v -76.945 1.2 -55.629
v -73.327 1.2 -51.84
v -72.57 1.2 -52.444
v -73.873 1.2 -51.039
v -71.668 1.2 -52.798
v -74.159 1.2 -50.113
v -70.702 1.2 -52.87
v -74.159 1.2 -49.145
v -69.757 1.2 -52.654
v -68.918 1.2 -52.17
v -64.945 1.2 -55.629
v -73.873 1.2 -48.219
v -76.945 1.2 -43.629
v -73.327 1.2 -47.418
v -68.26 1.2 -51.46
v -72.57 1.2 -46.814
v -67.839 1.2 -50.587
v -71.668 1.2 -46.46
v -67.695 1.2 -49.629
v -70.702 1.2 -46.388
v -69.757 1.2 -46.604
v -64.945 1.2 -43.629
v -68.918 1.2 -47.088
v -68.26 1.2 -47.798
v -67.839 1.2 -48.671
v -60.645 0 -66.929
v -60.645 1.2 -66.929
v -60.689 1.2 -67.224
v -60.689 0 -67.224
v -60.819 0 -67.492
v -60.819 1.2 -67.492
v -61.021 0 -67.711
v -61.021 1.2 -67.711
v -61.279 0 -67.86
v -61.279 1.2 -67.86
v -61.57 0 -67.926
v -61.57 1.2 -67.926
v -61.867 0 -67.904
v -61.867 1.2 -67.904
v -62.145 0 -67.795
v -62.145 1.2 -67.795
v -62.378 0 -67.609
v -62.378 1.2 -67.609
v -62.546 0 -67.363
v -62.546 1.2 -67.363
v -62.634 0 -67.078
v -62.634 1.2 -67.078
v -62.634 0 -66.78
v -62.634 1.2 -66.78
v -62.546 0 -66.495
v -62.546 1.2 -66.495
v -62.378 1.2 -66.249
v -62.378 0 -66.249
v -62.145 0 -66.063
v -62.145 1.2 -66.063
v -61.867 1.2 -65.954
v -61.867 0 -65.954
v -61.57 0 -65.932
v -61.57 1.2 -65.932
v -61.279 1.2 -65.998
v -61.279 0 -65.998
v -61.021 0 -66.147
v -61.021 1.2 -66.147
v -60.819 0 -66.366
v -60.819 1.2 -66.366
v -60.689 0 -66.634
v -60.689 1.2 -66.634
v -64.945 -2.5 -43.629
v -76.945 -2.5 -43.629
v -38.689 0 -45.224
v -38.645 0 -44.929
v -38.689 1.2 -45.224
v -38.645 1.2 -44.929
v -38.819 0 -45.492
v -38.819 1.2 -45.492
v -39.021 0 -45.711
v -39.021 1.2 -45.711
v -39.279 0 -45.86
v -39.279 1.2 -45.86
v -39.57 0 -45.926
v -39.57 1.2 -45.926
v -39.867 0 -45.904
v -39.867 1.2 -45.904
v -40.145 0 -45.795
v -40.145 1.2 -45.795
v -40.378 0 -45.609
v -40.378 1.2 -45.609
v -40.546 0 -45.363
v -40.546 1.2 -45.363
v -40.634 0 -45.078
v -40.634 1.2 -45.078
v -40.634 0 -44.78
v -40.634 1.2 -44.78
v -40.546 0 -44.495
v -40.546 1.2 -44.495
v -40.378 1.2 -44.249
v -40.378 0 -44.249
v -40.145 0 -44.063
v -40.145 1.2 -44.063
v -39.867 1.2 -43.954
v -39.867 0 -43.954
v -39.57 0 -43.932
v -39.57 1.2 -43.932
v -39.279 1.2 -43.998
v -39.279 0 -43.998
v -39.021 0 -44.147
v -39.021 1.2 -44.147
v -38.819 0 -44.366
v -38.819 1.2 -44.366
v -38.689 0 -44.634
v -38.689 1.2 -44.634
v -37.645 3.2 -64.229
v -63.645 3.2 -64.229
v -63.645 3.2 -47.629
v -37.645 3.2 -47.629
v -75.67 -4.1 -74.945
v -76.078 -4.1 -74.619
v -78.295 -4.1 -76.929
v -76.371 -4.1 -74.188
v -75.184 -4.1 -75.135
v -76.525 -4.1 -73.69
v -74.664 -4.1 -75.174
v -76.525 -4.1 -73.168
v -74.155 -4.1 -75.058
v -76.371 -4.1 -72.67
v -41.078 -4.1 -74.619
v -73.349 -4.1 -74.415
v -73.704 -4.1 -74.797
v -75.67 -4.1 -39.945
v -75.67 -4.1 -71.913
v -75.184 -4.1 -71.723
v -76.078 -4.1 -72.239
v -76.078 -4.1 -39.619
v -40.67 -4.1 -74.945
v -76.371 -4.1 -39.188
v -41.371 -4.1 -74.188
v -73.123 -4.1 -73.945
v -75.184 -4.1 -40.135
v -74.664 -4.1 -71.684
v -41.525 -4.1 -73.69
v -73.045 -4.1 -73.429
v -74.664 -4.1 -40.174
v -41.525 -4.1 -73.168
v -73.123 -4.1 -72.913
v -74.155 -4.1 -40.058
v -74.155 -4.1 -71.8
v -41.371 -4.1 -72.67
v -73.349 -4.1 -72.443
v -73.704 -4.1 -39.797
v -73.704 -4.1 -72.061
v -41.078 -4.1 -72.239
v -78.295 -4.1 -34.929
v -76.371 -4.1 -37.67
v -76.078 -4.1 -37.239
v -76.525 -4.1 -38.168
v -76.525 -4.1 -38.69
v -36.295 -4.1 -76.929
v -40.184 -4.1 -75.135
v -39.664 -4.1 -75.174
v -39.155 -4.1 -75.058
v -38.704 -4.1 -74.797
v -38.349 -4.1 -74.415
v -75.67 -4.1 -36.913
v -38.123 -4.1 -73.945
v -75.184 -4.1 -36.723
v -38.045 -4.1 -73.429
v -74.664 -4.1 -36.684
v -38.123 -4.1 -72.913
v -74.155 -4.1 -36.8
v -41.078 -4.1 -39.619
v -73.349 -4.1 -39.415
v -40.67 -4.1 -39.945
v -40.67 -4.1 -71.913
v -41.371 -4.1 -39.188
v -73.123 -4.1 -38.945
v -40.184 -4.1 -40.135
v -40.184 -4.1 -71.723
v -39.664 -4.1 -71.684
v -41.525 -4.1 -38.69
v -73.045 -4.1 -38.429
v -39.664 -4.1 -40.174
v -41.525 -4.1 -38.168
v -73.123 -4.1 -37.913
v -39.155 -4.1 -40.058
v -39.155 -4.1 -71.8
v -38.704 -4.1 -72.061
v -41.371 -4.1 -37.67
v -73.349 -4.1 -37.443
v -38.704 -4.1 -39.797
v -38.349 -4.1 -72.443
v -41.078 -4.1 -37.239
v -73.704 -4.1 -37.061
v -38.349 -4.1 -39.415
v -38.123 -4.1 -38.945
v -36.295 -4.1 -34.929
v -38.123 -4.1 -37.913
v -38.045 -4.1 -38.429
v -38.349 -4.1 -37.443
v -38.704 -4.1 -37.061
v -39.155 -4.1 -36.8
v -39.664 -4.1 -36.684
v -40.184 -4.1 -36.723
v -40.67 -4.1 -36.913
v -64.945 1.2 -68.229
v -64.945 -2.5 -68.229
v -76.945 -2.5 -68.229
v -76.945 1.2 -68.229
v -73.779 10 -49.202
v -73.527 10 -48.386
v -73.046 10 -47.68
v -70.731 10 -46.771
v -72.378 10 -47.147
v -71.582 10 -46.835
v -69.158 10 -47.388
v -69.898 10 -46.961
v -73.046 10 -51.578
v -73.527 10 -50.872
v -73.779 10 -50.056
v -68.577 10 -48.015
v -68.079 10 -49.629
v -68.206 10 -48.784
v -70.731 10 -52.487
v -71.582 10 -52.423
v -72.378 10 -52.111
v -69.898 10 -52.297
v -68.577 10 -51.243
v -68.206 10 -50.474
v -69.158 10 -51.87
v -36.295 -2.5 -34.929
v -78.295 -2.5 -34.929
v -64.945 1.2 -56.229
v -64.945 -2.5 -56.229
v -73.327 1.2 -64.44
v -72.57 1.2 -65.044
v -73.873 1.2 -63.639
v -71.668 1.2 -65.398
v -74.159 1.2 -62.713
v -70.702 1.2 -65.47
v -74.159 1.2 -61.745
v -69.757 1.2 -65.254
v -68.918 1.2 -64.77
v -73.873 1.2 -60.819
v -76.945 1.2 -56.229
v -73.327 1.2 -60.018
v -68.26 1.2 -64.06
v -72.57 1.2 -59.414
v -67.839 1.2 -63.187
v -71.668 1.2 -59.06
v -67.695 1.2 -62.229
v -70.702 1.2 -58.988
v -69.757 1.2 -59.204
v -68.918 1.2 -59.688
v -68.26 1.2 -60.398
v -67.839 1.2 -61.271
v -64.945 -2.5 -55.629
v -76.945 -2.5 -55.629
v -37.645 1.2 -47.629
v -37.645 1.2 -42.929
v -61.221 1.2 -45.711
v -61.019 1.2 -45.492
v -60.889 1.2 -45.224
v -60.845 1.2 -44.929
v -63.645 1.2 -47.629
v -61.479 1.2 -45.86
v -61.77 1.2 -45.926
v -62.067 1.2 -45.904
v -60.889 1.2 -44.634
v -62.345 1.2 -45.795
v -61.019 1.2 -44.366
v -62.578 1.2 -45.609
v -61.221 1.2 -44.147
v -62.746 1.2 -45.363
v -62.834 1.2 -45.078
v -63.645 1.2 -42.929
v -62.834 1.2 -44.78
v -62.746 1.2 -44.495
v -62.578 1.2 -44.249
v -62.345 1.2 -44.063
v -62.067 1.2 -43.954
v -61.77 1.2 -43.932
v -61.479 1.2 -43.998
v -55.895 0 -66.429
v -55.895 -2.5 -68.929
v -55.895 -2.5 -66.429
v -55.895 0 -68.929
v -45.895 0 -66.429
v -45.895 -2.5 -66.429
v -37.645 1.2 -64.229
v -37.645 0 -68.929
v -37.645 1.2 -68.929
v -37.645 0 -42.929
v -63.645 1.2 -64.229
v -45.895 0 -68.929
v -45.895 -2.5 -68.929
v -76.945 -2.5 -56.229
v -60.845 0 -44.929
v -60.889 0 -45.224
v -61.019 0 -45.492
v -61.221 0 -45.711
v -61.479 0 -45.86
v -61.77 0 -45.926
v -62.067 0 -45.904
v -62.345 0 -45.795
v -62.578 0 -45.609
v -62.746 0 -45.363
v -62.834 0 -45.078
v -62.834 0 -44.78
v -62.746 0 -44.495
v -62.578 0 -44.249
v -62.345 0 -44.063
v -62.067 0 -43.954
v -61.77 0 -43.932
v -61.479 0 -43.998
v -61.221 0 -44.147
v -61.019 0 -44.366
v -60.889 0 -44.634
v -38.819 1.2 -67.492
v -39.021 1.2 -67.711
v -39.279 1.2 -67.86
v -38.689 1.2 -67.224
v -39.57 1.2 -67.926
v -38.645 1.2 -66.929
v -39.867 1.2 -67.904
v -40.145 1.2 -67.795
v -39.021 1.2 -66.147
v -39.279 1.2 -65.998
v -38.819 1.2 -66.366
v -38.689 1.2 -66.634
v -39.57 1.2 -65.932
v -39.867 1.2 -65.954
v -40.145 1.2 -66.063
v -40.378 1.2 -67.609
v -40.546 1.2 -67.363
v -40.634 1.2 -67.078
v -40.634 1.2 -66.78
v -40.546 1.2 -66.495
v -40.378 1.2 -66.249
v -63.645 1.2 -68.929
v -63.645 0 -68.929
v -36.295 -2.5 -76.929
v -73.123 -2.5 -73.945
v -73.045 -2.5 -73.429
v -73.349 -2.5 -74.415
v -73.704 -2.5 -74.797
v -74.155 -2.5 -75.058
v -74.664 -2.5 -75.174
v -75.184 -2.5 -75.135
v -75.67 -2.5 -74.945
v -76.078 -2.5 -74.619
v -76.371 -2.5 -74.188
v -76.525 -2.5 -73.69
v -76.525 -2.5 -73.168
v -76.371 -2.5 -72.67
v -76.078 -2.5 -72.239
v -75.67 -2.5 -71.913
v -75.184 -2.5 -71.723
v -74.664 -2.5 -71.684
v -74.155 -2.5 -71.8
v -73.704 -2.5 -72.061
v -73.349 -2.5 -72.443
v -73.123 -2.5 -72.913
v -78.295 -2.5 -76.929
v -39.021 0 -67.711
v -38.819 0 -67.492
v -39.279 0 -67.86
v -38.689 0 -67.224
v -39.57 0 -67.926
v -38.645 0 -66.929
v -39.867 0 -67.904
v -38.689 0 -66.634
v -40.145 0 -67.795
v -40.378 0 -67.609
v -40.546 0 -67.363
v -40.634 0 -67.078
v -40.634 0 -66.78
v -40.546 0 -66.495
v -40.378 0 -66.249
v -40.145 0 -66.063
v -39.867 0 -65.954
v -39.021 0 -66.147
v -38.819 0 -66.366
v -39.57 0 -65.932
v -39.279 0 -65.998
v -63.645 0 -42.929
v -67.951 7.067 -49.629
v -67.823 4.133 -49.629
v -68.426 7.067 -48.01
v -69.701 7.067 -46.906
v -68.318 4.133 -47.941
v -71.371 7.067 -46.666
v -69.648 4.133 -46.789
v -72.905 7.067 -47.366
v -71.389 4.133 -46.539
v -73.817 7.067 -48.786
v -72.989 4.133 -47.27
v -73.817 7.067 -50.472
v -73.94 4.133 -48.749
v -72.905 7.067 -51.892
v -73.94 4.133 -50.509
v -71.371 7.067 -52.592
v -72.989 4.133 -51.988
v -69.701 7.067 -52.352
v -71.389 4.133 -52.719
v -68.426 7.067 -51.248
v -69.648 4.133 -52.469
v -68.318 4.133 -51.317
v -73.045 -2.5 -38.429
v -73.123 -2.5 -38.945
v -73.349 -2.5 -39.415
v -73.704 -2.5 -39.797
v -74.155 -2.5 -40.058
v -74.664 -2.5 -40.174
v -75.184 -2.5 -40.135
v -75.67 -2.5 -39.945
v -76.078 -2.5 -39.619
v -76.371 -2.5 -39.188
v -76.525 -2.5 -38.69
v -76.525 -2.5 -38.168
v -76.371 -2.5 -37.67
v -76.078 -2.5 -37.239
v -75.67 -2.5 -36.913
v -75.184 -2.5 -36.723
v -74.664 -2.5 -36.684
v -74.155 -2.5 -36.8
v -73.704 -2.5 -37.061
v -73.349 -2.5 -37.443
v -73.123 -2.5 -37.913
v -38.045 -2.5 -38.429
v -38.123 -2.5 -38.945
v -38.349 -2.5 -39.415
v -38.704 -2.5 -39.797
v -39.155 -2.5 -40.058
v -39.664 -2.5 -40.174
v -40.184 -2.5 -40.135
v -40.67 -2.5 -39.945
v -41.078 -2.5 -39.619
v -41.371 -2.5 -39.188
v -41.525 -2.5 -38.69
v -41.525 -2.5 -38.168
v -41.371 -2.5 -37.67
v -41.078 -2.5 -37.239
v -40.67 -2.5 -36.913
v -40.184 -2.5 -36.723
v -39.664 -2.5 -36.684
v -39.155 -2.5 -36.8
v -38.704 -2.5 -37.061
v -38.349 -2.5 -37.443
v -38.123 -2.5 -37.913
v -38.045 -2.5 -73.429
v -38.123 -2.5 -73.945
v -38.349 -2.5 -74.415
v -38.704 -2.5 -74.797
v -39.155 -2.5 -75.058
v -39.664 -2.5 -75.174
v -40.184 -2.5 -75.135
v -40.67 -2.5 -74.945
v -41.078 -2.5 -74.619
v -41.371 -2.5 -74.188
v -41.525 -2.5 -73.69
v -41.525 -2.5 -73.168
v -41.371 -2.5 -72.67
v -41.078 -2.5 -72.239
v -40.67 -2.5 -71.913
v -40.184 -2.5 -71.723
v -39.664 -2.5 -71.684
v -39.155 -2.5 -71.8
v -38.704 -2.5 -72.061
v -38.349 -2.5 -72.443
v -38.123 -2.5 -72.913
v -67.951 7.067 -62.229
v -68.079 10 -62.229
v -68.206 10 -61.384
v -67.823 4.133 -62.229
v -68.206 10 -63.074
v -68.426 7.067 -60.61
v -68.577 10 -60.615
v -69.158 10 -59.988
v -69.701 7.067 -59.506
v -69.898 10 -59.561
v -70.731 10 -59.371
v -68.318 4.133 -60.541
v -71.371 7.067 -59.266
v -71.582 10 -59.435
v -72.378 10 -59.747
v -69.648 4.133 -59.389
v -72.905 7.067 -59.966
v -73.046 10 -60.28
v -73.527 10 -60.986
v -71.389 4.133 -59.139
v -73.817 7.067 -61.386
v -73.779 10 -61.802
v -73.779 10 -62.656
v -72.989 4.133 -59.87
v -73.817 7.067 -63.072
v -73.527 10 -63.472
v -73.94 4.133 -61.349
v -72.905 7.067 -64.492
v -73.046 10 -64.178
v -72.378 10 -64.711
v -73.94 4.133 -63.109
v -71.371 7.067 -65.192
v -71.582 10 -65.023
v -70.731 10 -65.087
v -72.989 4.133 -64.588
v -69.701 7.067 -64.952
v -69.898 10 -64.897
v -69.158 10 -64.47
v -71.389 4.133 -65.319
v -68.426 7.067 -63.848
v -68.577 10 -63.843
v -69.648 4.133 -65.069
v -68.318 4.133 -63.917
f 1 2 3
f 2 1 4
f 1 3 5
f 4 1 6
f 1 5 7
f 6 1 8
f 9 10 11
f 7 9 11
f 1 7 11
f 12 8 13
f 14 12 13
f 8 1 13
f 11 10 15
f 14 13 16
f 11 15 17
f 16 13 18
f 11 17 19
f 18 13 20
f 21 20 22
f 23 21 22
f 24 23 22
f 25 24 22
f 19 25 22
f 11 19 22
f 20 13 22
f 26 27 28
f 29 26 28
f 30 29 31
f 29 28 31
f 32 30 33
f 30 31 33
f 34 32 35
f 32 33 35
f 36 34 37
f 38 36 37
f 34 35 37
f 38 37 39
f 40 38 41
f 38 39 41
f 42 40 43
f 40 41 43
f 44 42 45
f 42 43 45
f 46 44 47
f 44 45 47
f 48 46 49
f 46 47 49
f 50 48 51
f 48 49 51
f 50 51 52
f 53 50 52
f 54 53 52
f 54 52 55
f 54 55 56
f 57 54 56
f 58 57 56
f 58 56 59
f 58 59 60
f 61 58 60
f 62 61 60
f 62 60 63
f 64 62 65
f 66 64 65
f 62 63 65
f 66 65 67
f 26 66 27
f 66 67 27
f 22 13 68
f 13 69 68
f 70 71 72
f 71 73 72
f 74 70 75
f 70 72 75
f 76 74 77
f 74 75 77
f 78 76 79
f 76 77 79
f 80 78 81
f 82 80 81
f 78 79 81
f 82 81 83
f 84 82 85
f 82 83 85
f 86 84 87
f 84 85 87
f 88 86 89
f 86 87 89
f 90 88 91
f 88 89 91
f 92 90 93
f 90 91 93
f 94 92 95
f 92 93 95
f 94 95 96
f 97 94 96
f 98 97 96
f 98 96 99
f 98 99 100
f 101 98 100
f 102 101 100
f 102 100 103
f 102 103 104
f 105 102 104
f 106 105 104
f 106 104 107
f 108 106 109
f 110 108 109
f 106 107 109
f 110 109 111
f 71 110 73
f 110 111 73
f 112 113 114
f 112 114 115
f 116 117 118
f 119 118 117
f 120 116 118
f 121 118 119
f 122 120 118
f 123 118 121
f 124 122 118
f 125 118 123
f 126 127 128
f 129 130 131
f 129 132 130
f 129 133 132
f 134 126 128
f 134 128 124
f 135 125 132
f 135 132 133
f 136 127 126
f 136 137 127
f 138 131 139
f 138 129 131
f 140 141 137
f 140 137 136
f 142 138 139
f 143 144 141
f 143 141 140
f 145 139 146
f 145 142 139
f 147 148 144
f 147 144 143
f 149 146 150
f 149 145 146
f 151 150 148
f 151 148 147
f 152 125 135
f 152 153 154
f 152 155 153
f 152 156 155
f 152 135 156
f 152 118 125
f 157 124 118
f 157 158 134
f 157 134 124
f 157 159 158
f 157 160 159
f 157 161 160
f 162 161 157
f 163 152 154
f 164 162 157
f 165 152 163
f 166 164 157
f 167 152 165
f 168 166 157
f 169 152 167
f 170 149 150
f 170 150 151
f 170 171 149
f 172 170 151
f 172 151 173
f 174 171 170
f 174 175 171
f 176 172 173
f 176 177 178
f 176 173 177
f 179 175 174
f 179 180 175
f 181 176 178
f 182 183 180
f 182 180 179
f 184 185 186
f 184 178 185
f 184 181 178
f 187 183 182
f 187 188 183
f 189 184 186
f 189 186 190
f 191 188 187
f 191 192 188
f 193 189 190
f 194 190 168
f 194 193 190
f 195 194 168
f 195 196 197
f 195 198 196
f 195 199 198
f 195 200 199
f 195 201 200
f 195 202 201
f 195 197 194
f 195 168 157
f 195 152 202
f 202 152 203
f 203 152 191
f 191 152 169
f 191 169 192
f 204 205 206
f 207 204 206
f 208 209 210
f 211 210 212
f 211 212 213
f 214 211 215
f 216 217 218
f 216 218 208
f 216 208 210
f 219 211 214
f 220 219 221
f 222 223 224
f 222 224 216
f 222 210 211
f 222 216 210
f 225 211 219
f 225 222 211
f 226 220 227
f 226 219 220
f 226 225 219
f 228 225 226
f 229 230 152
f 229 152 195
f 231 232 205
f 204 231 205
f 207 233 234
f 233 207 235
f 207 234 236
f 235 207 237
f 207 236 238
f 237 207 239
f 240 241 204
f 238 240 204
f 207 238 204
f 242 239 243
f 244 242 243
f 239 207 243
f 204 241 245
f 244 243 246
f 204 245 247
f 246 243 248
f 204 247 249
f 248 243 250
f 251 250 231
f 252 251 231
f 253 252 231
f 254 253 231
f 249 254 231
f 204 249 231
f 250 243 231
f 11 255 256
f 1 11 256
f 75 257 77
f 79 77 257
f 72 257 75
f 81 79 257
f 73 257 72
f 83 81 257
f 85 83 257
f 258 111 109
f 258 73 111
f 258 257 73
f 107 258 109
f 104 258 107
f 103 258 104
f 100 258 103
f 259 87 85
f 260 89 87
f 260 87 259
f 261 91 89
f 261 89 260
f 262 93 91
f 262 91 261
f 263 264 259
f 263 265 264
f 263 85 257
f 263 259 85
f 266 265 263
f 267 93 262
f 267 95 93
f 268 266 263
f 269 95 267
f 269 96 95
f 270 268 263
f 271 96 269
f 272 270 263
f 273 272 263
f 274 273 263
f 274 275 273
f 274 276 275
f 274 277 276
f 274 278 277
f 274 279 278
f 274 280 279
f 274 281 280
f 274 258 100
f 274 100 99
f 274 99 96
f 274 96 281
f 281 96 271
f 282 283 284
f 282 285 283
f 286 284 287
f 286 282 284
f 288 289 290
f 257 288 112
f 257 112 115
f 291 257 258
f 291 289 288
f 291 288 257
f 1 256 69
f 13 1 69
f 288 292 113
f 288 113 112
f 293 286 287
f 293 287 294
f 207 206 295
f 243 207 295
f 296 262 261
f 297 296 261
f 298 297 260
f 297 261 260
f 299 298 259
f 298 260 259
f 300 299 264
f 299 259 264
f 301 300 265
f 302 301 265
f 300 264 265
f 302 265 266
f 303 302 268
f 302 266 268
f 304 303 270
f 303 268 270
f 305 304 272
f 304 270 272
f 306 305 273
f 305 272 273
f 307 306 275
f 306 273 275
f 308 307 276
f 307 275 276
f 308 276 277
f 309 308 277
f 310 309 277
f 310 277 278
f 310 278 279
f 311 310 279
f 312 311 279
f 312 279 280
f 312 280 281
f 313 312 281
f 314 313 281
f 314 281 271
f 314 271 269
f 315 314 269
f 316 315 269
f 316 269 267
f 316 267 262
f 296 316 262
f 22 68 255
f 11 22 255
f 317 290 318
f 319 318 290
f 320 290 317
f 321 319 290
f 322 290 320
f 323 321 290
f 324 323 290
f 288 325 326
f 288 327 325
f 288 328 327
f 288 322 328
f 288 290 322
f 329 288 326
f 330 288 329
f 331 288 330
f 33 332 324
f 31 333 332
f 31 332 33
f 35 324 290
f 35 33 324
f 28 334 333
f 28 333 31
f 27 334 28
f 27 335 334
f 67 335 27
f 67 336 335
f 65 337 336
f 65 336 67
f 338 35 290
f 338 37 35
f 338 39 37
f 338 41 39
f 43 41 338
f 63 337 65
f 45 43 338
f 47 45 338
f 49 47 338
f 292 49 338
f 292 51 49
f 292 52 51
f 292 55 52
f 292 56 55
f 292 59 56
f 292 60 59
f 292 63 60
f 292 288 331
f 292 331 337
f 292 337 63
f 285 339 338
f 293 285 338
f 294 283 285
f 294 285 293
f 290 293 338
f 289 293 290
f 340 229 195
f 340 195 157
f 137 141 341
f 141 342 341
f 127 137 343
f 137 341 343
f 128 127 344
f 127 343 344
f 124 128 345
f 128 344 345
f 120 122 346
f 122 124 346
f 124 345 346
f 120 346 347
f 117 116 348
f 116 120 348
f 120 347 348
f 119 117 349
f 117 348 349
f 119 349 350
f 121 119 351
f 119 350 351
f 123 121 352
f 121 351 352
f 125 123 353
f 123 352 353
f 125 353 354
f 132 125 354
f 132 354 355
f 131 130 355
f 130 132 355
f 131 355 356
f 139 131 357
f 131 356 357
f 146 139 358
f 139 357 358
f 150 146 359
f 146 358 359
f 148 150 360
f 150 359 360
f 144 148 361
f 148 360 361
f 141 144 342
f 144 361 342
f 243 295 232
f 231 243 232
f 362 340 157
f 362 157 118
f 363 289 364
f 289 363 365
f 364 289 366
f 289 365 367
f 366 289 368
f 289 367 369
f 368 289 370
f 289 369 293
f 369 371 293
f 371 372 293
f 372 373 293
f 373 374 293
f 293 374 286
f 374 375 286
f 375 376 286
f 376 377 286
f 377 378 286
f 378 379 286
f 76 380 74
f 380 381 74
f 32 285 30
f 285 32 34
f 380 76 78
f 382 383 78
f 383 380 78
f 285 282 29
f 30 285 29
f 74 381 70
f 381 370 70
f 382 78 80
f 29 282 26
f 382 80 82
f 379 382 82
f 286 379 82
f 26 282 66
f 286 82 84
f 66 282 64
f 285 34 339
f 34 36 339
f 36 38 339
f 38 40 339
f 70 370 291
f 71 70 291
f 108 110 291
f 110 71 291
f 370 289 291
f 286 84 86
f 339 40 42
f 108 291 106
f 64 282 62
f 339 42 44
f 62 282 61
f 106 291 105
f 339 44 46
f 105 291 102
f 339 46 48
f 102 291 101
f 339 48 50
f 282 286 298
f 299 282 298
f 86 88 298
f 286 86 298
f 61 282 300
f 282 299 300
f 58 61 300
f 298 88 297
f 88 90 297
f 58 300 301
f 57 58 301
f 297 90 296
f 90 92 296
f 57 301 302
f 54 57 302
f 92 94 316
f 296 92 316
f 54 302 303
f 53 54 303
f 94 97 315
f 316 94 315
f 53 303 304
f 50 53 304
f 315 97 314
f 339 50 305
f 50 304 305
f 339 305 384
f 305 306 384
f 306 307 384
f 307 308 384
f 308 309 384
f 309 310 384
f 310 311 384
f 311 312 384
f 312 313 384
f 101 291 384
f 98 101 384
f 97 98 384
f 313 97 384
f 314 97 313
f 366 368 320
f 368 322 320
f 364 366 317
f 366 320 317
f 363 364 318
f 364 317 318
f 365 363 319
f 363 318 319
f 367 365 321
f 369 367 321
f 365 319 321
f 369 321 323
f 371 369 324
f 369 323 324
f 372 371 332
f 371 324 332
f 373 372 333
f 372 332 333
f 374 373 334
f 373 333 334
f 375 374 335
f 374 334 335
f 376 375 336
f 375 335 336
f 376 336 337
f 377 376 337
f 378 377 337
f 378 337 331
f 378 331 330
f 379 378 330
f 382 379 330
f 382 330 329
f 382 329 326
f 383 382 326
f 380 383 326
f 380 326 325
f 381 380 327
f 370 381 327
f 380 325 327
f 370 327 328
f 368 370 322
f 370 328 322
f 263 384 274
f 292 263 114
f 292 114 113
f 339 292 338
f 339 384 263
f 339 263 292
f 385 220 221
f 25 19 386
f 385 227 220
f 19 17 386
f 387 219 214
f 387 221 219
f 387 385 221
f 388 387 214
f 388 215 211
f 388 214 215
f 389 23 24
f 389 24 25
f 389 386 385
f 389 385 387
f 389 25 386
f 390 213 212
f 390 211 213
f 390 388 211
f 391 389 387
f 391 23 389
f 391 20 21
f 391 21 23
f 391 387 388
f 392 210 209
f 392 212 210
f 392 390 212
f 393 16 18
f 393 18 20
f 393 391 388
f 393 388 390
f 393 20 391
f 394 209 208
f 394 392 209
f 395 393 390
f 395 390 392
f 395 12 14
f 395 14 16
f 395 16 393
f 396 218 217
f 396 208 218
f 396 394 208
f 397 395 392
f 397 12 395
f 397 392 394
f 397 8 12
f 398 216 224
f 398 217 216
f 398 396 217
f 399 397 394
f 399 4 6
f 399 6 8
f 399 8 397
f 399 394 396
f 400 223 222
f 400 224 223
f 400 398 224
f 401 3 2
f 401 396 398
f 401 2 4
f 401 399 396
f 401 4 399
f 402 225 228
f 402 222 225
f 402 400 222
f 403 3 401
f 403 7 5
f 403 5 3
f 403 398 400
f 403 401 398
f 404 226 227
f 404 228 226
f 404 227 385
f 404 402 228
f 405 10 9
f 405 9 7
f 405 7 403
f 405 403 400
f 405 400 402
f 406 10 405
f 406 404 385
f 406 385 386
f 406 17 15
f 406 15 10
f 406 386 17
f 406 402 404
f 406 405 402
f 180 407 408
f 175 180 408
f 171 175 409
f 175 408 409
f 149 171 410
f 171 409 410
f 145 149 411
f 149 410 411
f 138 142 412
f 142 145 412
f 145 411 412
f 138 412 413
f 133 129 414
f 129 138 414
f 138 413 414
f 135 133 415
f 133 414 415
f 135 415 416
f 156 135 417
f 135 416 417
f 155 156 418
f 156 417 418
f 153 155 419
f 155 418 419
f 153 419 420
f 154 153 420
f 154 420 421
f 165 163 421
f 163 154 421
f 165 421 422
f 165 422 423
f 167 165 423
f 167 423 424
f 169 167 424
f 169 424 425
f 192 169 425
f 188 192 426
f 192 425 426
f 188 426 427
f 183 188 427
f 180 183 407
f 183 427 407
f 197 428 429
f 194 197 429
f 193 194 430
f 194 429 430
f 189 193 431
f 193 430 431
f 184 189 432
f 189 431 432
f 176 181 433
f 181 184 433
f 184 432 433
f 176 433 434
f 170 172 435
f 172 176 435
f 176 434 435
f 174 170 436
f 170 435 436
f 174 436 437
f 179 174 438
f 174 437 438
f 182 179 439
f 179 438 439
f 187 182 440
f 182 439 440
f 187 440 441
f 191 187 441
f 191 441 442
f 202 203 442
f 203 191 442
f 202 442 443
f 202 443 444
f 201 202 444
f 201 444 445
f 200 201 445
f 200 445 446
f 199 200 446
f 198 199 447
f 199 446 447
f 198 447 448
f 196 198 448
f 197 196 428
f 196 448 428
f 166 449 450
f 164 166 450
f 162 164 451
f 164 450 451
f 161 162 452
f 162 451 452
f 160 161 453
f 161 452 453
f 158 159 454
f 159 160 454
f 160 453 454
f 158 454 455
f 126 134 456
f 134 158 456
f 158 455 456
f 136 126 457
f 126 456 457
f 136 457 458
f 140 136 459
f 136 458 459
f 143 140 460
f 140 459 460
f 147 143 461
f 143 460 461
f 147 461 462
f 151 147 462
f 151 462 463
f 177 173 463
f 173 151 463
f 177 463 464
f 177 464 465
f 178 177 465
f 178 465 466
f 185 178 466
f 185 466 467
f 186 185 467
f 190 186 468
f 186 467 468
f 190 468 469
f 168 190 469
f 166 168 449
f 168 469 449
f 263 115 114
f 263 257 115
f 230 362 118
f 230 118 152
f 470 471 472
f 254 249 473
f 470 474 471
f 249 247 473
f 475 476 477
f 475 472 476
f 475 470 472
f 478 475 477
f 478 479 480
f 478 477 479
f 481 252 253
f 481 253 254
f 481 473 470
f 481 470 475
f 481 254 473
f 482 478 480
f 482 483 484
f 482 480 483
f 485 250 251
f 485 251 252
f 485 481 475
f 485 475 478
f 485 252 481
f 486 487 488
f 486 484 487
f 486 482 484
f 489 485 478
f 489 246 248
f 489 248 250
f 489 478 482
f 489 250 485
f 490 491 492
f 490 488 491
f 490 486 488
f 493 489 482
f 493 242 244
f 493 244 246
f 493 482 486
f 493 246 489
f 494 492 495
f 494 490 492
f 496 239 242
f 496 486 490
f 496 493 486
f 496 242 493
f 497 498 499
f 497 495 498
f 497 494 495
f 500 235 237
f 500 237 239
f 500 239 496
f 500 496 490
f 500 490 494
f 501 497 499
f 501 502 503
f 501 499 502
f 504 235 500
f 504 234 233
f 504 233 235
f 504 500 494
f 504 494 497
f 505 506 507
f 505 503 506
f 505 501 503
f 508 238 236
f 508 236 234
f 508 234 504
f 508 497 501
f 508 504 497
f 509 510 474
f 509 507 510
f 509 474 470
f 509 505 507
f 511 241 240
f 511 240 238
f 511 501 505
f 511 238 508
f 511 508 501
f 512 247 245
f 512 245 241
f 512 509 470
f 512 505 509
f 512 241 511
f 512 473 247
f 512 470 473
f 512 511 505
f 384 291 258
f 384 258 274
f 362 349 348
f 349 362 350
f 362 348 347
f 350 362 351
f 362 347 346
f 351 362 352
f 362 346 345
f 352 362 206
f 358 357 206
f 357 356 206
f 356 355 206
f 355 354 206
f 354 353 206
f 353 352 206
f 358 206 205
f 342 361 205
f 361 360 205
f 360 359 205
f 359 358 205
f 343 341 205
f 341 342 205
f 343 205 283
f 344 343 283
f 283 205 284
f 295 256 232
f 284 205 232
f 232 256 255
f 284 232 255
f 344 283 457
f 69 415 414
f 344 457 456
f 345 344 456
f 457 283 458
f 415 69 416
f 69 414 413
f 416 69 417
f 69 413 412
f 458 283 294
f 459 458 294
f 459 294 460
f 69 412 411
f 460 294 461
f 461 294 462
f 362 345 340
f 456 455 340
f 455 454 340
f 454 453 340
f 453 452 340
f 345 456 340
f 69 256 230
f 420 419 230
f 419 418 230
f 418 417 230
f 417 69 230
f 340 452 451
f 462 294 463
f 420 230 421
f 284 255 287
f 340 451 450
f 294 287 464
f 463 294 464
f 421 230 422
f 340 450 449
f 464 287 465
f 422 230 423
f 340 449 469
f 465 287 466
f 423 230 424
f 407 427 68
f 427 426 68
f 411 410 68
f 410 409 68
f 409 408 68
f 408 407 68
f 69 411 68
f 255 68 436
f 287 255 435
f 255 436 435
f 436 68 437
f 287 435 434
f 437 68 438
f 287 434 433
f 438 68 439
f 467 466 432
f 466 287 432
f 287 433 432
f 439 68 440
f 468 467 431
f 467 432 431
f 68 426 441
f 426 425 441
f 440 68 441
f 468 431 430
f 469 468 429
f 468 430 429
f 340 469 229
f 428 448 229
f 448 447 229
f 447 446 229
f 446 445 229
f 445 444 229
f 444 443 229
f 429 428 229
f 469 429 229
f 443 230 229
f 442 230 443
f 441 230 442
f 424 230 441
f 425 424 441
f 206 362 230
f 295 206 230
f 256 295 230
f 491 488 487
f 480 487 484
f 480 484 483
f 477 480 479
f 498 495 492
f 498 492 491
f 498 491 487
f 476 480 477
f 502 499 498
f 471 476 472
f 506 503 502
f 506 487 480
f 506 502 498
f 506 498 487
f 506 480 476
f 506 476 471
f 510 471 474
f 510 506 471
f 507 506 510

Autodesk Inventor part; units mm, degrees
ref_plane "YZ Plane" through (0, 0, 0) normal (1, 0, 0) x (0, 1, 0)
ref_plane "XZ Plane" through (0, 0, 0) normal (0, 1, 0) x (-1, 0, 0)
ref_plane "XY Plane" through (0, 0, 0) normal (0, 0, 1) x (1, 0, 0)
sketch "Sketch1" plane through (0, 0, 0) normal (0, 1, 0) x (-1, 0, 0)
  line L0 (63.6448, -68.929) -> (37.6448, -68.929)
  line L1 (37.6448, -68.929) -> (37.6448, -42.929)
  line L2 (37.6448, -42.929) -> (63.6448, -42.929)
  line L3 (63.6448, -42.929) -> (63.6448, -68.929)
  point P0 (0, 0)
  dimension "d0" = 26
  dimension "d1" = 26
extrude "Extrusion1" add sketch "Sketch1" along normal blind 1.2
sketch "Sketch2" plane through (0, 1.2, 0) normal (0, 1, 0) x (1, 0, 0)
  line L0 (-63.6448, 68.929) -> (-63.6448, 42.929) projected
  line L1 (-37.6448, 42.929) -> (-37.6448, 68.929) projected
  line L2 (-63.6448, 64.229) -> (-37.6448, 64.229)
  line L3 (-37.6448, 64.229) -> (-37.6448, 47.629)
  line L4 (-37.6448, 47.629) -> (-63.6448, 47.629)
  line L5 (-63.6448, 47.629) -> (-63.6448, 64.229)
  line L6 (-37.6448, 68.929) -> (-63.6448, 68.929) projected
  point P0 (0, 0)
  point P1 (-63.6448, 47.629)
  dimension "d4" = 4.7
  dimension "d5" = 16.6
extrude "Extrusion2" add sketch "Sketch2" along normal blind 2 contours L2 L1 L4 L0
sketch "Sketch3" plane through (0, 1.2, 0) normal (0, 1, 0) x (1, 0, 0)
  circle A0 centre (-61.6448, 66.929) radius 1
  circle A1 centre (-39.6448, 66.929) radius 1
  circle A2 centre (-39.6448, 44.929) radius 1
  circle A3 centre (-61.8448, 44.929) radius 1
  line L0 (-63.6448, 68.929) -> (-63.6448, 64.229) projected
  line L1 (-37.6448, 68.929) -> (-63.6448, 68.929) projected
  line L2 (-37.6448, 64.229) -> (-37.6448, 68.929) projected
  line L3 (-37.6448, 42.929) -> (-37.6448, 47.629) projected
  line L4 (-63.6448, 42.929) -> (-37.6448, 42.929) projected
  line L5 (-63.6448, 47.629) -> (-63.6448, 42.929) projected
  point P0 (0, 0)
  point P1 (-63.6448, 45.279)
  dimension "d8" = 2
  dimension "d9" = 2
  dimension "d10" = 2
  dimension "d11" = 2
  dimension "d12" = 2
  dimension "d13" = 2
  dimension "d14" = 2
  dimension "d15" = 2
  dimension "d16" = 2
  dimension "d17" = 2
  dimension "d18" = 2
  dimension "d19" = 1.8
extrude "Extrusion3" cut sketch "Sketch3" against normal through all
sketch "Sketch4" plane through (0, 0, 0) normal (0, -1, 0) x (1, 0, 0)
  line L0 (-45.8948, -68.929) -> (-55.8948, -68.929)
  line L1 (-55.8948, -68.929) -> (-55.8948, -66.429)
  line L2 (-55.8948, -66.429) -> (-45.8948, -66.429)
  line L3 (-45.8948, -66.429) -> (-45.8948, -68.929)
  line L4 (-37.6448, -68.929) -> (-63.6448, -68.929) projected
  line L5 (-37.6448, -42.929) -> (-37.6448, -68.929) projected
  point P0 (0, 0)
  dimension "d22" = 10
  dimension "d23" = 2.5
  dimension "d24" = 0
  dimension "d25" = 8.25
extrude "Extrusion4" add sketch "Sketch4" along normal blind 2.5
sketch "Sketch5" plane through (0, -2.5, 0) normal (0, -1, 0) x (1, 0, 0)
  line L0 (-64.9448, -68.229) -> (-76.9448, -68.229)
  line L1 (-76.9448, -68.229) -> (-76.9448, -56.229)
  line L2 (-76.9448, -56.229) -> (-64.9448, -56.229)
  line L3 (-64.9448, -56.229) -> (-64.9448, -68.229)
  line L4 (-64.9448, -55.629) -> (-76.9448, -55.629)
  line L5 (-76.9448, -55.629) -> (-76.9448, -43.629)
  line L6 (-76.9448, -43.629) -> (-64.9448, -43.629)
  line L7 (-64.9448, -43.629) -> (-64.9448, -55.629)
  line L8 (-55.8948, -68.929) -> (-63.6448, -68.929) projected
  line L9 (-63.6448, -68.929) -> (-63.6448, -42.929) projected
  line L10 (-63.6448, -42.929) -> (-37.6448, -42.929) projected
  point P0 (0, 0)
  dimension "d28" = 12
  dimension "d29" = 12
  dimension "d30" = 12
  dimension "d31" = 12
  dimension "d32" = 0.7
  dimension "d33" = 1.3
  dimension "d34" = 0.7
extrude "Extrusion5" add sketch "Sketch5" against normal blind 3.7
sketch "Sketch7" plane through (0, 1.2, 0) normal (0, 1, 0) x (1, 0, 0)
  circle A0 centre (-70.9448, 62.229) radius 3.25
  circle A1 centre (-70.9448, 49.629) radius 3.25
  line L0 (-64.9448, 68.229) -> (-76.9448, 68.229) projected
  line L1 (-76.9448, 68.229) -> (-76.9448, 43.629) projected
  line L2 (-64.9448, 55.629) -> (-76.9448, 55.629) projected
  line L3 (-76.9448, 55.629) -> (-76.9448, 43.629) projected
  point P0 (0, 0)
  point P1 (-76.9448, 56.229)
  dimension "d47" = 6.5
  dimension "d48" = 6.5
  dimension "d49" = 6
  dimension "d50" = 6
  dimension "d51" = 6
  dimension "d52" = 6
extrude "Extrusion7" add sketch "Sketch7" along normal blind 8.8
draft "FaceDraft3" angle 2.5 pull direction (0, 1, 0) faces at (-67.7053, 7.0667, -61.9675) fixed edges at (-74.1948, 1.2, -62.229)
draft "FaceDraft4" angle 2.5 pull direction (0, 1, 0) faces at (-67.7053, 7.0667, -49.3675) fixed edges at (-74.1948, 1.2, -49.629)
sketch "Sketch8" plane through (0, -2.5, 0) normal (0, -1, 0) x (1, 0, 0)
  line L0 (-78.2948, -34.929) -> (-36.2948, -34.929)
  line L1 (-36.2948, -34.929) -> (-36.2948, -76.929)
  line L2 (-36.2948, -76.929) -> (-78.2948, -76.929)
  line L3 (-78.2948, -76.929) -> (-78.2948, -34.929)
  line L4 (-63.6448, -42.929) -> (-37.6448, -42.929) projected
  line L5 (-37.6448, -42.929) -> (-37.6448, -68.929) projected
  circle A0 centre (-74.7948, -73.429) radius 1.75
  circle A1 centre (-39.7948, -73.429) radius 1.75
  circle A2 centre (-74.7948, -38.429) radius 1.75
  circle A3 centre (-39.7948, -38.429) radius 1.75
  line L6 (-37.6448, -47.629) -> (-37.6448, -64.229) projected
  point P0 (0, 0)
  point P1 (-37.6448, -55.929)
  dimension "d57" = 42
  dimension "d58" = 42
  dimension "d59" = 8
  dimension "d63" = 3.5
  dimension "d64" = 3.5
  dimension "d65" = 3.5
  dimension "d66" = 3.5
  dimension "d67" = 3.5
  dimension "d68" = 3.5
  dimension "d69" = 3.5
  dimension "d70" = 3.5
  dimension "d71" = 3.5
  dimension "d72" = 3.5
  dimension "d73" = 3.5
  dimension "d74" = 3.5
  dimension "d75" = 1.35
extrude "Extrusion8" add sketch "Sketch8" along normal blind 1.6
equation "\"d14\" = d13"
equation "\"d15\" = d14"
equation "\"d16\" = d14"
equation "\"d17\" = d15"
equation "\"d18\" = d12"
equation "\"d51\" = d49"
equation "\"d52\" = d50"
equation "\"d64\" = d63"
equation "\"d65\" = d63"
equation "\"d66\" = d63"
equation "\"d68\" = d67"
equation "\"d69\" = d68"
equation "\"d70\" = d68"
equation "\"d71\" = d69"
equation "\"d72\" = d70"
equation "\"d73\" = d67"
equation "\"d74\" = d68"
properties part number "display_buttons"
